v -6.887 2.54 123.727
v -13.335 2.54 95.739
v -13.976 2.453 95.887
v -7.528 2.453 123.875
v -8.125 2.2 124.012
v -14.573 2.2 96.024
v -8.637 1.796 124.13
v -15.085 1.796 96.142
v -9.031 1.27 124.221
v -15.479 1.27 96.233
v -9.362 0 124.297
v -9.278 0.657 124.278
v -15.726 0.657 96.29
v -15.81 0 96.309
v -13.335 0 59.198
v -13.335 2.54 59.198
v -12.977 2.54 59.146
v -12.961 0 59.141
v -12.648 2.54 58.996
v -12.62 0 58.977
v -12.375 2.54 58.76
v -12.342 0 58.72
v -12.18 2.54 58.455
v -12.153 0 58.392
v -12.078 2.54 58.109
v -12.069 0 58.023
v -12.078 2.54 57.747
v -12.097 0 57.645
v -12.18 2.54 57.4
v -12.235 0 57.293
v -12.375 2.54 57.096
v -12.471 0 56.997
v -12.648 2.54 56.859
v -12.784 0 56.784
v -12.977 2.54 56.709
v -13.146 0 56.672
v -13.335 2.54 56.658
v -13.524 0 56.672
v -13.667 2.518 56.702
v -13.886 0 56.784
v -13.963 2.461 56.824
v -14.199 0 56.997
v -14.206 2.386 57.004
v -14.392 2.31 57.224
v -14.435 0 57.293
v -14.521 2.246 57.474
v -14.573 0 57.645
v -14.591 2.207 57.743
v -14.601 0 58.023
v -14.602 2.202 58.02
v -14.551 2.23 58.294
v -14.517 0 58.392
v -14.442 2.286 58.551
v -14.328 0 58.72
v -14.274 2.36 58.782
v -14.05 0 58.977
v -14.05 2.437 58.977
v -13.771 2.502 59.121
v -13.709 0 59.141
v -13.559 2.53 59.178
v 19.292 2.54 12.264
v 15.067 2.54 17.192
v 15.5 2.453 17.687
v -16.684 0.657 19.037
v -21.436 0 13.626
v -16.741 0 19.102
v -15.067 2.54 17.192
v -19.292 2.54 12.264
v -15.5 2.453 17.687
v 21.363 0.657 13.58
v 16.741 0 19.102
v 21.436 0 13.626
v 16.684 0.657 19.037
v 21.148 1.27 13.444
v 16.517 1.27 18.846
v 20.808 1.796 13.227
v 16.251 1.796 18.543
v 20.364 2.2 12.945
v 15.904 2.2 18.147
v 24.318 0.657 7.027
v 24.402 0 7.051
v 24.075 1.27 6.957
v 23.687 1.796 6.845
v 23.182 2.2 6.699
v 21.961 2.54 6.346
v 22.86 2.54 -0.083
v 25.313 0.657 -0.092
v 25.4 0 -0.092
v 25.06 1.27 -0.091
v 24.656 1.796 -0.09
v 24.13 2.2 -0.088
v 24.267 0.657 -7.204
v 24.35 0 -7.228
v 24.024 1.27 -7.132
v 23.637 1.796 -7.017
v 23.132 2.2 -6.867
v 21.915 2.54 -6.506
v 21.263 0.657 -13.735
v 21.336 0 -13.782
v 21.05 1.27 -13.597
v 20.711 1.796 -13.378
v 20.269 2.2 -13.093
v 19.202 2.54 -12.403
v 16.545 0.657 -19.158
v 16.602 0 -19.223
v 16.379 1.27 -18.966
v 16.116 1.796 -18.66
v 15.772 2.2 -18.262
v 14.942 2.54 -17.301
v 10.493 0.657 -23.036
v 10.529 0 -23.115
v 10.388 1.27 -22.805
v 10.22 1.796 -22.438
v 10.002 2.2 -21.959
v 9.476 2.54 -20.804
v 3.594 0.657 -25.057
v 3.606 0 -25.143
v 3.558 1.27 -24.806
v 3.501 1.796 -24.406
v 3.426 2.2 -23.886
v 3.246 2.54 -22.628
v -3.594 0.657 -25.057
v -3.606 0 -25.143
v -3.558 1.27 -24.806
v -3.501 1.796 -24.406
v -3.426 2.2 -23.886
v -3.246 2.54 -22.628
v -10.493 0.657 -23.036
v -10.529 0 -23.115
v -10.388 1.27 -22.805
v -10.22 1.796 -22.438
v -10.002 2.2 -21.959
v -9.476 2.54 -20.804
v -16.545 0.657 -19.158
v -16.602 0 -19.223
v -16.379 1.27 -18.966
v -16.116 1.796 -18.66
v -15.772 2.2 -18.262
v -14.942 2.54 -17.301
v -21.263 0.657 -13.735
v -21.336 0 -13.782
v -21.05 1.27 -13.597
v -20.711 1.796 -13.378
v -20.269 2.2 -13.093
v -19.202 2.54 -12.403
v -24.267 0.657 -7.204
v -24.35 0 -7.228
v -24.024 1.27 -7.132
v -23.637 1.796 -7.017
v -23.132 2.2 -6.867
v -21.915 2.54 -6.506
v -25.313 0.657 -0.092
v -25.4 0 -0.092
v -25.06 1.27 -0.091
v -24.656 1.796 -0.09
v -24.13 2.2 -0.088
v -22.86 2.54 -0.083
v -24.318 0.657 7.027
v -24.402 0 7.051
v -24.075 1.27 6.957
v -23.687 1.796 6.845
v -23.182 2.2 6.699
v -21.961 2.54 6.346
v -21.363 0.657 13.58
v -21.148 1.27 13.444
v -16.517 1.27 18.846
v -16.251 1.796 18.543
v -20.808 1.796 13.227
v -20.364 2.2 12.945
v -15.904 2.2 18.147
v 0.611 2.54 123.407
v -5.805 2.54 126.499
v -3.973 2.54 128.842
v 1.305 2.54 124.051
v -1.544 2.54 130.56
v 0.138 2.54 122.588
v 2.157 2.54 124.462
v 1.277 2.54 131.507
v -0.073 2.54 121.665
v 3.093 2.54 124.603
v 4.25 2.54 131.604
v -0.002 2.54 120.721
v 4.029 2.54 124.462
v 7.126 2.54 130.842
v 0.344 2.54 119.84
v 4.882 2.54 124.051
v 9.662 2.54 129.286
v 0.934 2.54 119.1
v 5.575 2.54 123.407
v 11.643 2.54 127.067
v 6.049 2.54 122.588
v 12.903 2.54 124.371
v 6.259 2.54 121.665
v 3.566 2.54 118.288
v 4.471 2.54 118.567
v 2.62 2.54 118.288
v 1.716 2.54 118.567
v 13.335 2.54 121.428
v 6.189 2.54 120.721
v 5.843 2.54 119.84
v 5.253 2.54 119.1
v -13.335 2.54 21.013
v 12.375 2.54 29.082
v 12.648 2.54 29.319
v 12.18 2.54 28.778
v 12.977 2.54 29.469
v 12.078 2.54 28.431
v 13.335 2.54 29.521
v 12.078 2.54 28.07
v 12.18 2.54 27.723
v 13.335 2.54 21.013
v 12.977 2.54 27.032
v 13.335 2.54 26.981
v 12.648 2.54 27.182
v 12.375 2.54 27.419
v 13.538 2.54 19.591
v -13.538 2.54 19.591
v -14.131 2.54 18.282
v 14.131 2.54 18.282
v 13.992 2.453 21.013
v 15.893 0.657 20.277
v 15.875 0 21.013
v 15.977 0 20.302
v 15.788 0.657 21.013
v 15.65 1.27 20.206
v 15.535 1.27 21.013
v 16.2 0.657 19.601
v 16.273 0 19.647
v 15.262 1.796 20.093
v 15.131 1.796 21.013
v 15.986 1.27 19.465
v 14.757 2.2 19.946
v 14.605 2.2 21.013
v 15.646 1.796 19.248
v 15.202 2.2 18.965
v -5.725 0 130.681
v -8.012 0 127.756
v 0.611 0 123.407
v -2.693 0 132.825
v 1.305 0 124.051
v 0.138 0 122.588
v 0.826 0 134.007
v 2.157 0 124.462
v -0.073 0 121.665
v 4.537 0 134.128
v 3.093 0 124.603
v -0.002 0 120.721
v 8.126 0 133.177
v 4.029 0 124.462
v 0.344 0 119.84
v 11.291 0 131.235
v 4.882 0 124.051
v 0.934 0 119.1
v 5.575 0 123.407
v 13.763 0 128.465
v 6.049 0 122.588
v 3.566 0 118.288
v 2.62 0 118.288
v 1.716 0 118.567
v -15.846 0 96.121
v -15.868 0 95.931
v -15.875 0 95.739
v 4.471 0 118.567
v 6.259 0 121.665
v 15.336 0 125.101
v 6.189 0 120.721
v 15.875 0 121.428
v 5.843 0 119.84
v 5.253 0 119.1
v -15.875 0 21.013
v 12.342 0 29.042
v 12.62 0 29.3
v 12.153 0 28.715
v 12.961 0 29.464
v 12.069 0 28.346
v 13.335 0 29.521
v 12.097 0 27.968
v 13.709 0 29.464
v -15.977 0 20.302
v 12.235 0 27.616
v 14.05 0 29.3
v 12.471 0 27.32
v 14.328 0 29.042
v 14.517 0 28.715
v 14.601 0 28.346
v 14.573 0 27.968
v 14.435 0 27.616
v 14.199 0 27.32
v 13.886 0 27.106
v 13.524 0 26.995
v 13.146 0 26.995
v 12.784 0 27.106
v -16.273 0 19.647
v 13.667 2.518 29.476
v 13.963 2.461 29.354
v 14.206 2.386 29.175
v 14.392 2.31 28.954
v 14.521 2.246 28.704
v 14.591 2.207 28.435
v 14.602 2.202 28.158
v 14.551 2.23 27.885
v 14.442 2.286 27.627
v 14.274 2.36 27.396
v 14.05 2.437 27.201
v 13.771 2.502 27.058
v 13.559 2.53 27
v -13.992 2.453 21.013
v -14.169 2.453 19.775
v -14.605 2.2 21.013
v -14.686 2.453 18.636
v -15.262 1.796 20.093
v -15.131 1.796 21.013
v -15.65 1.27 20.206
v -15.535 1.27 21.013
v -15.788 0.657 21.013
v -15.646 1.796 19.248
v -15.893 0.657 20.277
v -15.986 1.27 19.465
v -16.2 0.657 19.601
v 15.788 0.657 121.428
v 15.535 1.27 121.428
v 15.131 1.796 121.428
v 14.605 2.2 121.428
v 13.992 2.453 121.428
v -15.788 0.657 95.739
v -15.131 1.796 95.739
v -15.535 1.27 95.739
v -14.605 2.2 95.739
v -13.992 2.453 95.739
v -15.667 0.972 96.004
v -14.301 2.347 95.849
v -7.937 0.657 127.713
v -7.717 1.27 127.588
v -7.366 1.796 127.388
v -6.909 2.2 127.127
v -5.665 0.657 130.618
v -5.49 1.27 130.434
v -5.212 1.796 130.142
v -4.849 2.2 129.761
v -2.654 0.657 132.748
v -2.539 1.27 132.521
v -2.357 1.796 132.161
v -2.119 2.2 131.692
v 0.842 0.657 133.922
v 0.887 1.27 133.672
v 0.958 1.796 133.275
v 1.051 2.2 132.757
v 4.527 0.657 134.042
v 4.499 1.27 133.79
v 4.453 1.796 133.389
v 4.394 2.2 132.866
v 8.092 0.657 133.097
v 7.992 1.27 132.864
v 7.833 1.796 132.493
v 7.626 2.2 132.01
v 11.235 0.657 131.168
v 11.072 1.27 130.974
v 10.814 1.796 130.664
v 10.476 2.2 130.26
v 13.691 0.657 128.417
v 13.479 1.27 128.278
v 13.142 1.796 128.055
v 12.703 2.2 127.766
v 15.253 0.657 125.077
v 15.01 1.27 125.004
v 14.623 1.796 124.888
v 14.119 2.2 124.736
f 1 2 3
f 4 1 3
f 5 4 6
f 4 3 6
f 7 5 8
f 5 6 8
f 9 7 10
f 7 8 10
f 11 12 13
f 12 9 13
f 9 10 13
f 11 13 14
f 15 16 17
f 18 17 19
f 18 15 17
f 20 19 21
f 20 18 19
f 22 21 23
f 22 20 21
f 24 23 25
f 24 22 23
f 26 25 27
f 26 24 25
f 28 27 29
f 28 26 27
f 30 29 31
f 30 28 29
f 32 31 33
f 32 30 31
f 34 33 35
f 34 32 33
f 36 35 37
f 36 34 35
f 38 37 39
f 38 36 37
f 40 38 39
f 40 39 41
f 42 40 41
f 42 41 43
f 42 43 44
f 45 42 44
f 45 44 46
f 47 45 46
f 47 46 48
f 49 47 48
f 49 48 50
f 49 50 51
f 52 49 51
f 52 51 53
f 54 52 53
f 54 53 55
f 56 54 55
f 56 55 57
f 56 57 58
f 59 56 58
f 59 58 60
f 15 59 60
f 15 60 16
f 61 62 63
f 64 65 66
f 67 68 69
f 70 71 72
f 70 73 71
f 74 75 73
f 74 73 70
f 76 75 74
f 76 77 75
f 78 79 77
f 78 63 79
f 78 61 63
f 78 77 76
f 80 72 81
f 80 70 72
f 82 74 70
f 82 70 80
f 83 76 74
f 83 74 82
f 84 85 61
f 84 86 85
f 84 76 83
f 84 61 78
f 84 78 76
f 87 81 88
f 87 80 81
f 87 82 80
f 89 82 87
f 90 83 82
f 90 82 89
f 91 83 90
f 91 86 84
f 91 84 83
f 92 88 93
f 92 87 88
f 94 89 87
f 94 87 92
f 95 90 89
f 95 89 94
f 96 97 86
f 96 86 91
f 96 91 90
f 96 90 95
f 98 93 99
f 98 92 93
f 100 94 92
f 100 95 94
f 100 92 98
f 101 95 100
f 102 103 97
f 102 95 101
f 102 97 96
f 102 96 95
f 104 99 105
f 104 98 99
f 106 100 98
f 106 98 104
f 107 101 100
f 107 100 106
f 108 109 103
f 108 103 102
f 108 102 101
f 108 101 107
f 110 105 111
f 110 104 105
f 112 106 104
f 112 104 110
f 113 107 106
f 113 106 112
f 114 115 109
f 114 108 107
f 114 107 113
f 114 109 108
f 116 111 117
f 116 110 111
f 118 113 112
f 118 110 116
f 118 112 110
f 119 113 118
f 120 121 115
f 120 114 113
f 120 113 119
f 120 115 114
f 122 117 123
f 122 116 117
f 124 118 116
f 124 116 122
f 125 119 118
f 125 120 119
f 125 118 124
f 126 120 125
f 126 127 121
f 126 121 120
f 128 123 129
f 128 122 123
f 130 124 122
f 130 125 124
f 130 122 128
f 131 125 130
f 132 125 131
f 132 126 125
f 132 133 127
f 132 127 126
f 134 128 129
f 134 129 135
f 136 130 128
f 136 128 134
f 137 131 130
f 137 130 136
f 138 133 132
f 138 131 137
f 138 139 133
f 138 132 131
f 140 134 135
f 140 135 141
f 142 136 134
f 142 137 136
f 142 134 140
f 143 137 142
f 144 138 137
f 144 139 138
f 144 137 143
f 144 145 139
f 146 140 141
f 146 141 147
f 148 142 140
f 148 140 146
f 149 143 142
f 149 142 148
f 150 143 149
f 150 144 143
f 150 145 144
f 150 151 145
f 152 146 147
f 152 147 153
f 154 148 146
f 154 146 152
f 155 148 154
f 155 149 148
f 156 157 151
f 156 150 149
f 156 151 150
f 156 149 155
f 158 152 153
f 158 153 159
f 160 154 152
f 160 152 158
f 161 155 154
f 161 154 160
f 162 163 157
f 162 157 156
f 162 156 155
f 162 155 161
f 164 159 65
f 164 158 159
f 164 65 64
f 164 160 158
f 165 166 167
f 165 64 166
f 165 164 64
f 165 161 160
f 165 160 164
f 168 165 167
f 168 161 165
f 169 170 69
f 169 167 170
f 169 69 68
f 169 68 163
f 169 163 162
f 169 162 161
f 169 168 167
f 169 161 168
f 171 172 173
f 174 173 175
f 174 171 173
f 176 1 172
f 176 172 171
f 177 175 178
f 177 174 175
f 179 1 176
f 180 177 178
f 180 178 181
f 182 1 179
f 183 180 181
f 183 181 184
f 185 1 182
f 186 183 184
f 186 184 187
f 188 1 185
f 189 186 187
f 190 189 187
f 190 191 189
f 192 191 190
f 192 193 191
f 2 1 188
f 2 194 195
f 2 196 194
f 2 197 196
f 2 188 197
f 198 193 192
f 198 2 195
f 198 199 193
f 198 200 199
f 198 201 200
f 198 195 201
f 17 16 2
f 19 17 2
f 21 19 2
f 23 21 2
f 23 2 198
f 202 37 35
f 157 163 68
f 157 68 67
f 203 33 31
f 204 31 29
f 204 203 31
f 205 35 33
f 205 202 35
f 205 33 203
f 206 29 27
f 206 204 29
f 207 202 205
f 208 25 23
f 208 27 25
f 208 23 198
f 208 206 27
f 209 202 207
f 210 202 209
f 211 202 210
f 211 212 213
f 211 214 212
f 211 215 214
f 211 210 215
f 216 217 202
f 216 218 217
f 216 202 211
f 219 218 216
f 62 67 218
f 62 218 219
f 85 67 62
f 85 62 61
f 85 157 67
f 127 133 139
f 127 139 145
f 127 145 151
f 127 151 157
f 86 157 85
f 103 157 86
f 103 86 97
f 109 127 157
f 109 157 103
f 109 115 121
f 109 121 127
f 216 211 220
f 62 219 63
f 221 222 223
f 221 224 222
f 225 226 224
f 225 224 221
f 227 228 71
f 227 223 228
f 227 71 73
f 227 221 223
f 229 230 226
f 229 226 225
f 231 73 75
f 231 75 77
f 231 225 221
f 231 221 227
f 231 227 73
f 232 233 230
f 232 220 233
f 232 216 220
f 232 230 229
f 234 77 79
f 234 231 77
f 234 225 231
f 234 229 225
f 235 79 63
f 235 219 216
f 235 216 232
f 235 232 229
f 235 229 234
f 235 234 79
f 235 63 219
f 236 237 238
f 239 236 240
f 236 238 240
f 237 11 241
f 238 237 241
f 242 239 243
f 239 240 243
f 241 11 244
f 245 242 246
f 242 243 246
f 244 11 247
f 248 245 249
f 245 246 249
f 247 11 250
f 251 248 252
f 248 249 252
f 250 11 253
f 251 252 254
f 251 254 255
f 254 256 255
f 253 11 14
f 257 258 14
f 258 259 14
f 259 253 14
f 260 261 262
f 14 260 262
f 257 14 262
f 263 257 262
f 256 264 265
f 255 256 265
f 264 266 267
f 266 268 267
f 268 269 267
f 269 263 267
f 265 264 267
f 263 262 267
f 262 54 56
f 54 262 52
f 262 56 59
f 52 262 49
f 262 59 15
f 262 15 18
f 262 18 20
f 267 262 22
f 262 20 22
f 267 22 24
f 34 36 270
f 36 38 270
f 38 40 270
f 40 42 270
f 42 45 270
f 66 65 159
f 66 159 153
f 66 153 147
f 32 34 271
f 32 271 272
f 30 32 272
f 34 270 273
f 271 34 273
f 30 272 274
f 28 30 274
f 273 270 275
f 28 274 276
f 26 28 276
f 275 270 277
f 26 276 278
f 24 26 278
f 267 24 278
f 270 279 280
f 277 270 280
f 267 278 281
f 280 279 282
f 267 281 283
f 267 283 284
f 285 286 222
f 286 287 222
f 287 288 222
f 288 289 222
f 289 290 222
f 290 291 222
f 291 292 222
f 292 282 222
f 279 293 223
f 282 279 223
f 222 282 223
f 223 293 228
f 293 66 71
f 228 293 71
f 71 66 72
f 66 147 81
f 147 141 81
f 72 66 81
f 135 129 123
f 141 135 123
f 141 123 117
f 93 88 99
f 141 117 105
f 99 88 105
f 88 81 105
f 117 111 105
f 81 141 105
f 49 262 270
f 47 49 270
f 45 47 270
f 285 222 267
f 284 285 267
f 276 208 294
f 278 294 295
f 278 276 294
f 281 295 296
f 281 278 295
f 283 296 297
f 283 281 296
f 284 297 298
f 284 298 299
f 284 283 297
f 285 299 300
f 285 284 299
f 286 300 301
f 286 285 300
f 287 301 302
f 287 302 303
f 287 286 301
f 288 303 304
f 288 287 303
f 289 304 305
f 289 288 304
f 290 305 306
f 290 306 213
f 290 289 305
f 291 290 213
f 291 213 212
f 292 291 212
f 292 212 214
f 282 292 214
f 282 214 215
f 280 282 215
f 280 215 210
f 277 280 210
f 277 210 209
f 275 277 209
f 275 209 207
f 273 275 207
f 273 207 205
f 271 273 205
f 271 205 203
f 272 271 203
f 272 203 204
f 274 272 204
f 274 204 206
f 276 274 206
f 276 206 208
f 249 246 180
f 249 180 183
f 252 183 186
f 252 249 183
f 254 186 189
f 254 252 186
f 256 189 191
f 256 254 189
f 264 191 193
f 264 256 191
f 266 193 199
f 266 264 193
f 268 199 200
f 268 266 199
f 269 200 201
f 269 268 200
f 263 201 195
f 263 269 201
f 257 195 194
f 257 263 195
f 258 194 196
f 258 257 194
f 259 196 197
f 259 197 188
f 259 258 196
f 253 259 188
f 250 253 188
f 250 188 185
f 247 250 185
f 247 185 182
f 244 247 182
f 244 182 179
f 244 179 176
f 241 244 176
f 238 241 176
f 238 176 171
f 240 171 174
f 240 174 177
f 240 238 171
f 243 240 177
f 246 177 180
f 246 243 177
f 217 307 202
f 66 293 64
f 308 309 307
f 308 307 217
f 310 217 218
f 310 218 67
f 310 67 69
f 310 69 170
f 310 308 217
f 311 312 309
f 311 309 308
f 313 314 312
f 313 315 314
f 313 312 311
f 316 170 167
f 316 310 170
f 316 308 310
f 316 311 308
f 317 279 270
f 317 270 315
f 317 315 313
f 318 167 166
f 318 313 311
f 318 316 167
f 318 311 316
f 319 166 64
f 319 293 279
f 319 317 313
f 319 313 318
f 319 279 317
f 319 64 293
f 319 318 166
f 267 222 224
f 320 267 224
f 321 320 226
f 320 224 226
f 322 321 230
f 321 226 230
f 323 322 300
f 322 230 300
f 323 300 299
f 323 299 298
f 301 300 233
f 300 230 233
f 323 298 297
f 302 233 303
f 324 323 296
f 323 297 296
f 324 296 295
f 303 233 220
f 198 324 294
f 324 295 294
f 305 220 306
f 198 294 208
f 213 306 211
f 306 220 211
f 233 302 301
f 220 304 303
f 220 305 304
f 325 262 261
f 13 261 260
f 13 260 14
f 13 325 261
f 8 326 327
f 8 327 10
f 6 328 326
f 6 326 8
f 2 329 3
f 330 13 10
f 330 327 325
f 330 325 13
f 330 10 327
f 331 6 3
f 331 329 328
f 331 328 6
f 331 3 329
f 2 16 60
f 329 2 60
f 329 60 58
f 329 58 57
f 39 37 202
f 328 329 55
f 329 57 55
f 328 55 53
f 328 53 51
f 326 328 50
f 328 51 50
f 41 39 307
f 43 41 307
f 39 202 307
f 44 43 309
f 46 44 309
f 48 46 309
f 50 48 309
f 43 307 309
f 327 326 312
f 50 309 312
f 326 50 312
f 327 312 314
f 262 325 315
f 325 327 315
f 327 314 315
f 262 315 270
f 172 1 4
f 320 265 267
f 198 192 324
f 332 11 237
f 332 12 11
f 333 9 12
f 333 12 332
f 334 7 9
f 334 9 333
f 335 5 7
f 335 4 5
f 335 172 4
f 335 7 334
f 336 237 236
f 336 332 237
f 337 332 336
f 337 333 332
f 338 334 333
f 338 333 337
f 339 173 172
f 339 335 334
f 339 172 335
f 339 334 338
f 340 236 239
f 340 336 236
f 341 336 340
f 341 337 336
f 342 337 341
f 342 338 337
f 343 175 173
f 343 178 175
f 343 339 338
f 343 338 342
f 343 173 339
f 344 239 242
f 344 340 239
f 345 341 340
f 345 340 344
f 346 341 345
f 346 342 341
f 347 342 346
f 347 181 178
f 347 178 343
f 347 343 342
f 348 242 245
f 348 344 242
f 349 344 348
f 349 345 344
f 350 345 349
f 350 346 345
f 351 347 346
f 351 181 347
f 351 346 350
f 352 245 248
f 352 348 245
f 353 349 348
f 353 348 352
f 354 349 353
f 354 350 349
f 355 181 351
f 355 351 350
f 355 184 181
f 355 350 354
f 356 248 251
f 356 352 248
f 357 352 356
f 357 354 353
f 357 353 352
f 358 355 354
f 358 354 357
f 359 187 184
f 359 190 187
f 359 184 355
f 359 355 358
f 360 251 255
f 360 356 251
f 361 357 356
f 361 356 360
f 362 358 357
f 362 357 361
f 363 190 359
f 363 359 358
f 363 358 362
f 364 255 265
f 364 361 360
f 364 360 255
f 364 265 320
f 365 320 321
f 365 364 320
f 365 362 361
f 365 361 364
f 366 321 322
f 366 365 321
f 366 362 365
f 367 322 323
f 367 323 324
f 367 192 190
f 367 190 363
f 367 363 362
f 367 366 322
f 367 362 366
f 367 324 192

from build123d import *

# Parameters (mm, degrees)
SKETCH1_R           = 3.175
SKETCH1_R_2         = 1.27
BOSS_EXTRUDE1_DEPTH = 2.54
FILLET1_R           = 2.54
FILLET2_R           = 2.54


with BuildPart() as part:
    # Sketch1 → Boss-Extrude1 (new body)
    with BuildSketch(Plane(origin=(0, 0, 0), x_dir=(1, 0, 0), z_dir=(0, 1, 0))):
        with BuildLine():
            Line((-15.875, -19.827868645), (-15.875, -96.027868645))
            Line((-15.875, -96.027868645), (-9.362396438, -124.297332186))
            ThreePointArc((-9.362396438, -124.297332186), (4.537150087, -134.127868645), (15.875, -121.427868645))
            Line((15.875, -121.427868645), (15.875, -96.027868645))
            Line((15.875, -96.027868645), (15.875, -19.827868645))
            ThreePointArc((15.875, -19.827868645), (0, 25.4), (-15.875, -19.827868645))
        make_face()
        with Locations(Location((3.093174395, -121.427868645, 0), (0, 0, 270))):
            Circle(SKETCH1_R, mode=Mode.SUBTRACT)
        with Locations(Location((-13.335, -57.927868645, 0), (0, 0, 270))):
            Circle(SKETCH1_R_2, mode=Mode.SUBTRACT)
        with Locations(Location((13.335, -28.25059986, 0), (0, 0, 270))):
            Circle(SKETCH1_R_2, mode=Mode.SUBTRACT)
    extrude(amount=BOSS_EXTRUDE1_DEPTH)

    # Fillet1
    fillet1_edges = [part.edges().sort_by_distance(p)[0] for p in [
        (15.875, 1.27, 19.827868645),
        (-15.875, 1.27, 96.027868645),
        (-15.875, 1.27, 19.827868645),
    ]]
    fillet(fillet1_edges, radius=FILLET1_R)

    # Fillet2
    # the kernel refuses this fillet: 2.54 mm, written as the material it takes off along each edge
    with BuildSketch(Plane(origin=(-18.415, 2.54, 21.012647977), x_dir=(1, 0, 0), z_dir=(0, 0, 1))) as fillet2_piece_1:
        with BuildLine():
            CenterArc((2.54 + FILLET2_R, -FILLET2_R), FILLET2_R, 90, 90)
            Line((2.54 + FILLET2_R, 0), (2.54, 0))
            Line((2.54, 0), (2.54, -FILLET2_R))
        make_face()
    revolve(axis=Axis((-18.415, 2.54, 21.012647977), (0, 1, 0)), revolution_arc=48.769422845, mode=Mode.SUBTRACT)
    with BuildSketch(Plane(origin=(0, 2.54, 0), x_dir=(0.6590909090909091, 0, 0.7520632776261045), z_dir=(-0.7520632776261045, 0, 0.6590909090909091))) as fillet2_piece_2:
        with BuildLine():
            CenterArc((25.4 - FILLET2_R, -FILLET2_R), FILLET2_R, 0, 90)
            Line((25.4, -FILLET2_R), (25.4, 0))
            Line((25.4, 0), (25.4 - FILLET2_R, 0))
        make_face()
    revolve(axis=Axis((0, 2.54, 0), (0, 1, 0)), revolution_arc=277.53884569, mode=Mode.SUBTRACT)
    with BuildSketch(Plane(origin=(18.415, 2.54, 21.012647977), x_dir=(-1, 0, 0), z_dir=(0, 0, 1))) as fillet2_piece_3:
        with BuildLine():
            CenterArc((2.54 + FILLET2_R, FILLET2_R), FILLET2_R, 180, 90)
            Line((2.54, FILLET2_R), (2.54, 0))
            Line((2.54, 0), (2.54 + FILLET2_R, 0))
        make_face()
    revolve(axis=Axis((18.415, 2.54, 21.012647977), (0, -1, 0)), revolution_arc=48.769422845, mode=Mode.SUBTRACT)
    with BuildSketch(Plane(origin=(15.875, 2.54, 21.012647977), x_dir=(-1, 0, 0), z_dir=(0, 0, 1))) as fillet2_piece_4:
        with BuildLine():
            CenterArc((FILLET2_R, FILLET2_R), FILLET2_R, 180, 90)
            Line((0, FILLET2_R), (0, 0))
            Line((0, 0), (FILLET2_R, 0))
        make_face()
    extrude(amount=100.415220668, mode=Mode.SUBTRACT)
    with BuildSketch(Plane(origin=(3.093174395, 2.54, 121.427868645), x_dir=(-0.9744751037997539, 0, 0.2244955947774008), z_dir=(-0.2244955947774008, 0, -0.9744751037997539))) as fillet2_piece_5:
        with BuildLine():
            CenterArc((12.781825605 - FILLET2_R, -FILLET2_R), FILLET2_R, 0, 90)
            Line((12.781825605, -FILLET2_R), (12.781825605, 0))
            Line((12.781825605, 0), (12.781825605 - FILLET2_R, 0))
        make_face()
    revolve(axis=Axis((3.093174395, 2.54, 121.427868645), (0, 1, 0)), revolution_arc=167.026780897, mode=Mode.SUBTRACT)
    with BuildSketch(Plane(origin=(-15.810166764, 2.54, 96.309292317), x_dir=(0.9744751037997537, 0, -0.22449559477740183), z_dir=(0.22449559477740183, 0, 0.9744751037997537))) as fillet2_piece_6:
        with BuildLine():
            CenterArc((FILLET2_R, -FILLET2_R), FILLET2_R, 90, 90)
            Line((0, -FILLET2_R), (0, 0))
            Line((0, 0), (FILLET2_R, 0))
        make_face()
    extrude(amount=28.721144091, mode=Mode.SUBTRACT)
    with BuildSketch(Plane(origin=(-13.335, 2.54, 95.739073507), x_dir=(-1, 0, 0), z_dir=(0, 0, -1))) as fillet2_piece_7:
        with BuildLine():
            CenterArc((2.54 - FILLET2_R, -FILLET2_R), FILLET2_R, 0, 90)
            Line((2.54 - FILLET2_R, 0), (2.54, 0))
            Line((2.54, 0), (2.54, -FILLET2_R))
        make_face()
    revolve(axis=Axis((-13.335, 2.54, 95.739073507), (0, 1, 0)), revolution_arc=12.973219103, mode=Mode.SUBTRACT)
    with BuildSketch(Plane(origin=(-15.875, 2.54, 21.012647977), x_dir=(0, -1, 0), z_dir=(0, 0, 1))) as fillet2_piece_8:
        with BuildLine():
            CenterArc((FILLET2_R, FILLET2_R), FILLET2_R, 180, 90)
            Line((0, FILLET2_R), (0, 0))
            Line((0, 0), (FILLET2_R, 0))
        make_face()
    extrude(amount=74.72642553, mode=Mode.SUBTRACT)


solid = part.part
